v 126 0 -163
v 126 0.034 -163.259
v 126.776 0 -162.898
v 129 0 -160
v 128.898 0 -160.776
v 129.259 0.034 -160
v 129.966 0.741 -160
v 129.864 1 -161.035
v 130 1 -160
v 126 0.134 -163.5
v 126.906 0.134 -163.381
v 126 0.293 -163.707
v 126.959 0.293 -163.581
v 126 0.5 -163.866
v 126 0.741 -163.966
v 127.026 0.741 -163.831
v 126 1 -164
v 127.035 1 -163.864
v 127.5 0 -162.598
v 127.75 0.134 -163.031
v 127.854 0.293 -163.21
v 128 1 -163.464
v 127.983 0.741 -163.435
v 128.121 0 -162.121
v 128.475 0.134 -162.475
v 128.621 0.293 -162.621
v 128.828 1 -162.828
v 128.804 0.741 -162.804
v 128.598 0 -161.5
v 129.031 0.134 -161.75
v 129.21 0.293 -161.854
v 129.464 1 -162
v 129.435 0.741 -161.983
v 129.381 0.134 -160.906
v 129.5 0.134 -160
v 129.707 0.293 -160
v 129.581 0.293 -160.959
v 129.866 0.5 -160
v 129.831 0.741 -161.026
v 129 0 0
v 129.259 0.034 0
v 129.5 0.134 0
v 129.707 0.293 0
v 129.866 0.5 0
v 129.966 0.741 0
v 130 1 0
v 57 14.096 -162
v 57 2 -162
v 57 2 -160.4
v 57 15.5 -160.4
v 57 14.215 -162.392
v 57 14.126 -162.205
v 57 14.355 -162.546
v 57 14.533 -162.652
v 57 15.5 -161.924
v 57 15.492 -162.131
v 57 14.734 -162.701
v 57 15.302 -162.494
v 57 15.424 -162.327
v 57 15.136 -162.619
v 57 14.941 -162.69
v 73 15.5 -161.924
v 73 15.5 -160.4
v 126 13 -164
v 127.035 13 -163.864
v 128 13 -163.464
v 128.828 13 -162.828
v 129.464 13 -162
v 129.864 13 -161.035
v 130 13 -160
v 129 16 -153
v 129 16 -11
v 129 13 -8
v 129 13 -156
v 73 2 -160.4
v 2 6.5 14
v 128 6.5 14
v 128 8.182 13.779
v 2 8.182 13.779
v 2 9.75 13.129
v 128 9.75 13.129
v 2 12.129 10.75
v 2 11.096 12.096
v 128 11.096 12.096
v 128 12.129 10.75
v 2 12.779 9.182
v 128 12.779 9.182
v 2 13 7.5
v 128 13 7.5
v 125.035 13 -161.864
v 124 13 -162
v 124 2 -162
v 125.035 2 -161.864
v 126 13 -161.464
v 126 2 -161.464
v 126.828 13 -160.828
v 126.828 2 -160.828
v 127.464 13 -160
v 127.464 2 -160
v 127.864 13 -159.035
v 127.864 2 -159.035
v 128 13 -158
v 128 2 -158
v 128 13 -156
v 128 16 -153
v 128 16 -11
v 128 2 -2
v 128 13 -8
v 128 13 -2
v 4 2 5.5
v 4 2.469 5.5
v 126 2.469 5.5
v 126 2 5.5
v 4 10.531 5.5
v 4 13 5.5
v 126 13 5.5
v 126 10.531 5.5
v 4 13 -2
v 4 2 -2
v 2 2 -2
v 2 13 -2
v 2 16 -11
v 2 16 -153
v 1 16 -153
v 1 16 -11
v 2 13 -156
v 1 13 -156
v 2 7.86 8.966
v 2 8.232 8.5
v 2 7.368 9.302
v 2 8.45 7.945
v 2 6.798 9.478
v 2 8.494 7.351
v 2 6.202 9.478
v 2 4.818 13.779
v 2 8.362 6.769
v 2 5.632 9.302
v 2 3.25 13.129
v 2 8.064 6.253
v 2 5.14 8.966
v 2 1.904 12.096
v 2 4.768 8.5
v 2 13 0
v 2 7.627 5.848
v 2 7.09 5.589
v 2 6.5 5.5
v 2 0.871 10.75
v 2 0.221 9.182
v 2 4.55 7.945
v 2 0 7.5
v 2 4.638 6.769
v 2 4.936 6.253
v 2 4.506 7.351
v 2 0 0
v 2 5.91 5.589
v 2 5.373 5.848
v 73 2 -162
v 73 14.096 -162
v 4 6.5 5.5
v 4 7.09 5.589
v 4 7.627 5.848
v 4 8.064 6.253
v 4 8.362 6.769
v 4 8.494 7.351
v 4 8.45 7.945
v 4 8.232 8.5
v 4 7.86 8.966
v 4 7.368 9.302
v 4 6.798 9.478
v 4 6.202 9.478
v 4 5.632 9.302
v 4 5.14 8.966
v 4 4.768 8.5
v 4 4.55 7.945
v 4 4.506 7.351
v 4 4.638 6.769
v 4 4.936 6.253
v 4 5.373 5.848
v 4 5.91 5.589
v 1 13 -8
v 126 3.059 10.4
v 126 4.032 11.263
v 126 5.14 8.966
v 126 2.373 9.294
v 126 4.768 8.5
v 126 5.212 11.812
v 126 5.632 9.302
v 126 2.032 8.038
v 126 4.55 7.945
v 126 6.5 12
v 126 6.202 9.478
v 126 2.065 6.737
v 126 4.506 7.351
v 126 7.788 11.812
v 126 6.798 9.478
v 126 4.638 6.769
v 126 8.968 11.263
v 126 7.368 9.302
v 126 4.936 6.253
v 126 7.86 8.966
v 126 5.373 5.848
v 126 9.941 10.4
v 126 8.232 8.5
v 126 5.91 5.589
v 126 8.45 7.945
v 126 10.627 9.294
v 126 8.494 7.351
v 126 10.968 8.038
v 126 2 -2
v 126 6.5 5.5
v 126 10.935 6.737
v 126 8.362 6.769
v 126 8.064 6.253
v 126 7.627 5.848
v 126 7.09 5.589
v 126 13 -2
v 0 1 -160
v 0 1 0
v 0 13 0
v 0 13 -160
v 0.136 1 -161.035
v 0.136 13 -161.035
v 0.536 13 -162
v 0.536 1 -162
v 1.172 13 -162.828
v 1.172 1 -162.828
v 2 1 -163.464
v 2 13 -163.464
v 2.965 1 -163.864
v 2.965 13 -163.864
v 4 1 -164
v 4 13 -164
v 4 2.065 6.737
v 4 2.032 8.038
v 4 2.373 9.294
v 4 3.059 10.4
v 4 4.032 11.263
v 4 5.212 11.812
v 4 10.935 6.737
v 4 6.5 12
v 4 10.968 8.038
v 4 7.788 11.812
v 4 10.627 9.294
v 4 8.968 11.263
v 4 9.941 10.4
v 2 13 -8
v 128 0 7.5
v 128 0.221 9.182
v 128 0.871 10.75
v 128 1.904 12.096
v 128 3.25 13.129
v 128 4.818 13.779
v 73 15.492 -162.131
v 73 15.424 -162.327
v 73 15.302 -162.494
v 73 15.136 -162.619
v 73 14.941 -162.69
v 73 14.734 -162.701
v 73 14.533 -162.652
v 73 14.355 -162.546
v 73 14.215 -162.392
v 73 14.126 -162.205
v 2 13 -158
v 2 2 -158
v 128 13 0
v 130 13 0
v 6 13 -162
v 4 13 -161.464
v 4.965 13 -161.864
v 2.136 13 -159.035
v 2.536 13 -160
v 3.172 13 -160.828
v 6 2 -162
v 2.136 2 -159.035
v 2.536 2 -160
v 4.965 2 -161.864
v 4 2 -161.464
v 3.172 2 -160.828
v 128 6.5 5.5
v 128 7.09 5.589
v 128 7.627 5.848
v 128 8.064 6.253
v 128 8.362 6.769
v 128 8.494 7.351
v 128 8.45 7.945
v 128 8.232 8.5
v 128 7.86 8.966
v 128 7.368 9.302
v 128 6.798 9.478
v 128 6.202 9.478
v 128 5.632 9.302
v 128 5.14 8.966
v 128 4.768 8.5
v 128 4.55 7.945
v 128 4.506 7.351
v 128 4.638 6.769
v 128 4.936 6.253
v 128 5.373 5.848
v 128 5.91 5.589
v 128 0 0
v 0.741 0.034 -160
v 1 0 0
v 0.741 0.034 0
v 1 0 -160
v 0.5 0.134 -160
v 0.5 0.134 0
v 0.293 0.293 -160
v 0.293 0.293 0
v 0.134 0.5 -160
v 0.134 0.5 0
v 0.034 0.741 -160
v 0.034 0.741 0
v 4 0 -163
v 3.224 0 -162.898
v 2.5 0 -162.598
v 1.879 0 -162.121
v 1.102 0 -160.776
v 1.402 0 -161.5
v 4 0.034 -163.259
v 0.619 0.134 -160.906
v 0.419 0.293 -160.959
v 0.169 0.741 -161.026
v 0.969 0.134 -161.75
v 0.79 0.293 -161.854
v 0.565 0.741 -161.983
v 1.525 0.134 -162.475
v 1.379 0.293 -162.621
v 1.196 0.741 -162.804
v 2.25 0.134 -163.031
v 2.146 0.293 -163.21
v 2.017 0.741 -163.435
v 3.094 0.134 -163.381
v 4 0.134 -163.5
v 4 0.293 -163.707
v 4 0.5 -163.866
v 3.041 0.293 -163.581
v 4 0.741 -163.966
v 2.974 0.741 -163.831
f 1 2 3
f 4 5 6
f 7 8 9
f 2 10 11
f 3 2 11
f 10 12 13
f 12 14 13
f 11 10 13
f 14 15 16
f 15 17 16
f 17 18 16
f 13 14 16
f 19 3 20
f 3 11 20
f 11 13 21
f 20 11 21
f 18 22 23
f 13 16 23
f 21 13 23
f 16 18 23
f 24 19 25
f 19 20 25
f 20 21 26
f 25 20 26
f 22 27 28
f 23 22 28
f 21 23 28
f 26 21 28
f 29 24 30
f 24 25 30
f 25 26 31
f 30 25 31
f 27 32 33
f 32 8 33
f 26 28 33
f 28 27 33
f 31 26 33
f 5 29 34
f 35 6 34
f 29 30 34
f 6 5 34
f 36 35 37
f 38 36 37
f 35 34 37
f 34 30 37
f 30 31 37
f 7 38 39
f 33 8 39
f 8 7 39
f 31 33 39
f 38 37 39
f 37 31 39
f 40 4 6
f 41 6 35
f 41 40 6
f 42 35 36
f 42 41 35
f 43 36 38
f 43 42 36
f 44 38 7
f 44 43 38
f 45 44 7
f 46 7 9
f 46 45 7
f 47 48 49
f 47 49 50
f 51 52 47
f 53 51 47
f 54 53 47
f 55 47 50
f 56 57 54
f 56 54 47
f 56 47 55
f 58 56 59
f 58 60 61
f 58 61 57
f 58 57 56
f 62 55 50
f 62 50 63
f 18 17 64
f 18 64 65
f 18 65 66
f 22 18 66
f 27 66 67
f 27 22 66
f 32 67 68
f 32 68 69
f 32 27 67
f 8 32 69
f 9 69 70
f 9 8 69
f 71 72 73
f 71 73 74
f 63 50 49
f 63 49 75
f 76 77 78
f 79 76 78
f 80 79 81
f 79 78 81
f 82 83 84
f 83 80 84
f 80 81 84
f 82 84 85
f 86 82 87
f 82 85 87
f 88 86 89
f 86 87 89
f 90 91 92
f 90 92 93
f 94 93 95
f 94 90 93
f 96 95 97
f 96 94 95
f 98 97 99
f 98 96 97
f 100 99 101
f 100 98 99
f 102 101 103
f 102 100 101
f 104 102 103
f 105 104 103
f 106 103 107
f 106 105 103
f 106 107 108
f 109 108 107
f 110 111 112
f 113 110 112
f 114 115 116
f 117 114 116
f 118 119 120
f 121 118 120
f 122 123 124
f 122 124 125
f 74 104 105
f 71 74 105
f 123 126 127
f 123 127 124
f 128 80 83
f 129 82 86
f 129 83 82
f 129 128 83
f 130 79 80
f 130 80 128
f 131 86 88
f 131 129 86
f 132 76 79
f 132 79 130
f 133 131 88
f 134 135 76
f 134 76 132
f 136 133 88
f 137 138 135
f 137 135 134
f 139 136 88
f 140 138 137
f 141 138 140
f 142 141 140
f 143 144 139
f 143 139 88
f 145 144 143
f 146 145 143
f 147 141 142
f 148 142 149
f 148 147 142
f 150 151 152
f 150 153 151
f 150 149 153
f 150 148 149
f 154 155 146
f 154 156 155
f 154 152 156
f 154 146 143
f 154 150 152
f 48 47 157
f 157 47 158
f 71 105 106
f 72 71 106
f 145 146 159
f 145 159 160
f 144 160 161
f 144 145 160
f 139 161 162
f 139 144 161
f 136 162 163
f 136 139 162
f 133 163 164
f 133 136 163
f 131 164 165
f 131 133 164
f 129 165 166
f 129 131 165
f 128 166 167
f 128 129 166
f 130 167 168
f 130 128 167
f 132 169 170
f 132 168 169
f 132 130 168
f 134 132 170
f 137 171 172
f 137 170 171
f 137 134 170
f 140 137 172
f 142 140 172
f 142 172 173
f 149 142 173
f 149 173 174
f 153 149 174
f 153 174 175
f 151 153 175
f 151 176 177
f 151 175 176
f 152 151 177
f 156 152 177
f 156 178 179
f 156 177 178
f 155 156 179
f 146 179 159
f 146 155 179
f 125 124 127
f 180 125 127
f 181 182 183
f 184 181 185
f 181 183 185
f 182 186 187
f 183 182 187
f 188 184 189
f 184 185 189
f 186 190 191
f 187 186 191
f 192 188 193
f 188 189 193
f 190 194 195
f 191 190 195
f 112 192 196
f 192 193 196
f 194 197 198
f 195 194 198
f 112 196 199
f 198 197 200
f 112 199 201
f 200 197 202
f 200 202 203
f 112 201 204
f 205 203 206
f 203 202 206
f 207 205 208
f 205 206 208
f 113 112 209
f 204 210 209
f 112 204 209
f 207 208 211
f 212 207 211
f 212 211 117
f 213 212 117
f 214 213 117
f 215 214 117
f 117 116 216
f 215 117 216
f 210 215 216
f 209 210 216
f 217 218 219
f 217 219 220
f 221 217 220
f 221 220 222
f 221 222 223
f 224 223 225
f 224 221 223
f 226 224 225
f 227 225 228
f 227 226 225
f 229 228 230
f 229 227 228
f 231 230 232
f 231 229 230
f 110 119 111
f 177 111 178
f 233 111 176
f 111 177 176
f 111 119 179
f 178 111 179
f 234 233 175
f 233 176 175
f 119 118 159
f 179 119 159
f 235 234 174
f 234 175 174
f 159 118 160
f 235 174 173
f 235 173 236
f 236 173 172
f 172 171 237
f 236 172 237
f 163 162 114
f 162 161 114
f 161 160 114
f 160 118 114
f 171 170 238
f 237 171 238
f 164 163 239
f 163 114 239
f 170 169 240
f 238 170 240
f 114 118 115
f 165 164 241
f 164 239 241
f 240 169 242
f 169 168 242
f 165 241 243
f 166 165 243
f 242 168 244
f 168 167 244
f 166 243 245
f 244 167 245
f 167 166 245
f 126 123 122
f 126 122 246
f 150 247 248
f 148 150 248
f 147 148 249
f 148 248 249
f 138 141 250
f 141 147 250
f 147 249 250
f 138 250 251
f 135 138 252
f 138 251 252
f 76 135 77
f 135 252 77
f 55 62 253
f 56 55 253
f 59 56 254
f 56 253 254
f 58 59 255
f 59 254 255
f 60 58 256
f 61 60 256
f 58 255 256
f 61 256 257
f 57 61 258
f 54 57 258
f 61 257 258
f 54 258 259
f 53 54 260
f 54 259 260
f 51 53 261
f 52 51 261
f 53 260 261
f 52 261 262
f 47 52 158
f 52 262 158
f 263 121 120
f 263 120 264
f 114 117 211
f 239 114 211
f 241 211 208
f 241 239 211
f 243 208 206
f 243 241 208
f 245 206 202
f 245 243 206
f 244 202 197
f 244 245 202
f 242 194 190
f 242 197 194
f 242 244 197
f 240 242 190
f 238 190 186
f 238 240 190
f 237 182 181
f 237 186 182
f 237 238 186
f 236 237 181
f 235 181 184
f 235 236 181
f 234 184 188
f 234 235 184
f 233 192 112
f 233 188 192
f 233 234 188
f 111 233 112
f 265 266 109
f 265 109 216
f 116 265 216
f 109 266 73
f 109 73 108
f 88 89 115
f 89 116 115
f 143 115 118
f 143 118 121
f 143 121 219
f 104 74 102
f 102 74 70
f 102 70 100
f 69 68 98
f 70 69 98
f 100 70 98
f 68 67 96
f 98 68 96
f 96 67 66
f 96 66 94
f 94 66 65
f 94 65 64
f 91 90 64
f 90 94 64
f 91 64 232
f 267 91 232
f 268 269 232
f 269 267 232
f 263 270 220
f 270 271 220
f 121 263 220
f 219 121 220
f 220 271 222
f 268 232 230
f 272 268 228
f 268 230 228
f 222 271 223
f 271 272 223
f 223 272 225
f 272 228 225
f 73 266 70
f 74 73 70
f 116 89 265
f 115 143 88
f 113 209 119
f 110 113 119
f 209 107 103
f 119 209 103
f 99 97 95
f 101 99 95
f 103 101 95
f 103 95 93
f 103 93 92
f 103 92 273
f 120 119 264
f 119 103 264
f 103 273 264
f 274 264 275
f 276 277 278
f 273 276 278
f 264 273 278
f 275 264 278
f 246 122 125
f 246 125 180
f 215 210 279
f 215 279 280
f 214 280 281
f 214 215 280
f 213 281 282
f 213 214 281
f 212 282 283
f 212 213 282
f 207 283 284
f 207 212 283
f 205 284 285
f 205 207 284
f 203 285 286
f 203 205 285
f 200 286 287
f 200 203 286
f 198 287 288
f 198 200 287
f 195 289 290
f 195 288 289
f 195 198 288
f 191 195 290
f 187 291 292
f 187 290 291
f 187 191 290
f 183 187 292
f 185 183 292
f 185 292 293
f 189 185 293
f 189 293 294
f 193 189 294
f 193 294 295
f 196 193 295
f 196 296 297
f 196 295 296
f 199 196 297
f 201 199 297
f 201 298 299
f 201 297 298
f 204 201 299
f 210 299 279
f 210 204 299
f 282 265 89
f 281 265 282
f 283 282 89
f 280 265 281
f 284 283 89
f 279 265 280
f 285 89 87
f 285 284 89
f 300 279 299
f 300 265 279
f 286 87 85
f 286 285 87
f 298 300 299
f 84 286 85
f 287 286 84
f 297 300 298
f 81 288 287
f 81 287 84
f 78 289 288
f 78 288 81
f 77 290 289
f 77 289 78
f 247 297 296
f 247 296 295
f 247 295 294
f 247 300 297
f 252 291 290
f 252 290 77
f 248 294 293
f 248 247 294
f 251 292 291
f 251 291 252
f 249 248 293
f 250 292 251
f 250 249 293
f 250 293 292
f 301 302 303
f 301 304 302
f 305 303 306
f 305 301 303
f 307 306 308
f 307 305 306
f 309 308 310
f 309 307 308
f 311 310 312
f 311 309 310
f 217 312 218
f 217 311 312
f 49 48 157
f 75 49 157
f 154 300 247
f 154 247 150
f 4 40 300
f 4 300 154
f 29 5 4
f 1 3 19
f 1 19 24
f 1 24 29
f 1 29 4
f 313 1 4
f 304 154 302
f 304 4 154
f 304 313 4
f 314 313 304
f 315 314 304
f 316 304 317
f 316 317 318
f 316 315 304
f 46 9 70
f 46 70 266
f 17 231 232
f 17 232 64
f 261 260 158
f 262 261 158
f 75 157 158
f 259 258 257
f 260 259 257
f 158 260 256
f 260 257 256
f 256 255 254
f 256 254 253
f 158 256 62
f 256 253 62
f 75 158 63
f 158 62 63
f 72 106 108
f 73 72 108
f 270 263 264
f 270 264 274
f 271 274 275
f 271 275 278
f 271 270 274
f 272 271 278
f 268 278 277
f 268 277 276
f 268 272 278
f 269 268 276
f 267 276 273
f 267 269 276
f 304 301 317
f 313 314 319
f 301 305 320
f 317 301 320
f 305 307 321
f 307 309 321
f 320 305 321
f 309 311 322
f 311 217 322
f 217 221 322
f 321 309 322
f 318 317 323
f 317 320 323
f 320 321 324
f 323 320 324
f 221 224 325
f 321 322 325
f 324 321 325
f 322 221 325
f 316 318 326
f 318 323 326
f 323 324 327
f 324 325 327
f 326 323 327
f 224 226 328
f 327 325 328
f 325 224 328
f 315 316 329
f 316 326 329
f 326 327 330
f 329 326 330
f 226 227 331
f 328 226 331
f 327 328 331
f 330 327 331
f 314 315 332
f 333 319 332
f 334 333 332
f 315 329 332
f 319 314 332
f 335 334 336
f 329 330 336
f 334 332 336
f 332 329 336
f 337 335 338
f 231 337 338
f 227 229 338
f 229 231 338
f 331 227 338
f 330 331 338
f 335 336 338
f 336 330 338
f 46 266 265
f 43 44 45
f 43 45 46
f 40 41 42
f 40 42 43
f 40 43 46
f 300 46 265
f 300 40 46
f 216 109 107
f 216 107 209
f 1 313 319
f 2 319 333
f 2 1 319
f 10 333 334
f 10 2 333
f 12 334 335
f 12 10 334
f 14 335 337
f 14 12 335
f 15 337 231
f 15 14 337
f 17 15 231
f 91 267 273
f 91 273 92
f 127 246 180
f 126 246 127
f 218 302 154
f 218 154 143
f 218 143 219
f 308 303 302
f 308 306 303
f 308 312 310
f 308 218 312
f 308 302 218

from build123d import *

# Parameters (mm, degrees)
SALIENTE_EXTRUIR1_DEPTH     = 13
CORTAR_EXTRUIR7_DEPTH       = 11
CORTAR_EXTRUIR9_DEPTH       = 140
CROQUIS10_R                 = 4.5
CORTAR_EXTRUIR10_DEPTH      = 122
CROQUIS11_W                 = 122
CROQUIS11_H                 = 12.524990812
CORTAR_EXTRUIR12_DEPTH      = 11
CORTAR_EXTRUIR13_DEPTH      = 130
CORTAR_EXTRUIR13_DEPTH_BACK = 130
CROQUIS12_R                 = 2
CROQUIS13_W                 = 16
CROQUIS13_H                 = 13.5
SALIENTE_EXTRUIR3_DEPTH     = 1.6
SALIENTE_EXTRUIR4_DEPTH     = 16
REDONDEO1_R                 = 1
SALIENTE_EXTRUIR5_DEPTH     = 1
SALIENTE_EXTRUIR6_DEPTH     = 1


with BuildPart() as part:
    # Croquis1 → Saliente-Extruir1 (new body)
    with BuildSketch(Plane(origin=(0, 0, 0), x_dir=(1, 0, 0), z_dir=(0, 1, 0))):
        with BuildLine():
            Line((130, 0), (128, 0))
            Line((128, 0), (128, -14))
            Line((128, -14), (2, -14))
            Line((2, -14), (2, 0))
            Line((2, 0), (0, 0))
            Line((0, 0), (0, 160))
            ThreePointArc((0, 160), (1.171572875, 162.828427125), (4, 164))
            Line((4, 164), (126, 164))
            ThreePointArc((126, 164), (128.828427125, 162.828427125), (130, 160))
            Line((130, 160), (130, 0))
        make_face()
    extrude(amount=SALIENTE_EXTRUIR1_DEPTH)

    # Croquis7 → Cortar-Extruir7 (cut)
    with BuildSketch(Plane(origin=(0, 13, 0), x_dir=(1, 0, 0), z_dir=(0, 1, 0))):
        with BuildLine():
            ThreePointArc((124, 162), (126.828427125, 160.828427125), (128, 158))
            Line((128, 158), (128, 2))
            Line((128, 2), (2, 2))
            Line((2, 2), (2, 158))
            ThreePointArc((2, 158), (3.171572875, 160.828427125), (6, 162))
            Line((6, 162), (62.001239157, 162))
            Line((62.001239157, 162), (124, 162))
        make_face()
    extrude(amount=-CORTAR_EXTRUIR7_DEPTH, mode=Mode.SUBTRACT)

    # Croquis8 → Cortar-Extruir9 (cut)
    with BuildSketch(Plane(origin=(128, 0, 0), x_dir=(0, 0, -1), z_dir=(1, 0, 0))):
        with BuildLine():
            ThreePointArc((-14, 6.5), (-12.096194078, 11.096194078), (-7.5, 13))
            Line((-7.5, 13), (-14, 13))
            Line((-14, 13), (-14, 6.5))
        make_face()
        with BuildLine():
            Line((-14, 0), (-7.5, 0))
            ThreePointArc((-7.5, 0), (-12.096194078, 1.903805922), (-14, 6.5))
            Line((-14, 6.5), (-14, 0))
        make_face()
    extrude(amount=-CORTAR_EXTRUIR9_DEPTH, mode=Mode.SUBTRACT)

    # Croquis10 → Cortar-Extruir10 (cut)
    with BuildSketch(Plane(origin=(4, 0, 0), x_dir=(0, 0, -1), z_dir=(1, 0, 0))):
        with Locations(Location((-7.5, 6.5, 0), (0, 0, 180))):
            Circle(CROQUIS10_R)
    extrude(amount=CORTAR_EXTRUIR10_DEPTH, mode=Mode.SUBTRACT)

    # Croquis11 → Cortar-Extruir12 (cut)
    with BuildSketch(Plane(origin=(0, 13, 0), x_dir=(1, 0, 0), z_dir=(0, 1, 0))):
        Polygon((4, 2), (4, -5.5), (6, -5.5), (126, -5.5), (126, 2), align=None)
        with Locations((65, 8.262495406)):
            Rectangle(CROQUIS11_W, CROQUIS11_H)
    extrude(amount=-CORTAR_EXTRUIR12_DEPTH, mode=Mode.SUBTRACT)

    # Croquis12 → Cortar-Extruir13 (cut, two sides: drawn at the far end of the back side and taken through both)
    with BuildSketch(Plane(origin=(4, 0, 0), x_dir=(0, 0, -1), z_dir=(1, 0, 0)).offset(-CORTAR_EXTRUIR13_DEPTH_BACK)):
        with Locations((-7.5, 6.5)):
            Circle(CROQUIS12_R)
    extrude(amount=CORTAR_EXTRUIR13_DEPTH + CORTAR_EXTRUIR13_DEPTH_BACK, mode=Mode.SUBTRACT)

    # Redondeo1
    redondeo1_edges = [part.edges().sort_by_distance(p)[0] for p in [
        (128.828427125, 0, -162.828427125),
        (130, 0, -80),
        (0, 0, -80),
        (1.171572875, 0, -162.828427125),
        (65, 0, -164),
    ]]
    fillet(redondeo1_edges, radius=REDONDEO1_R)

    # Croquis16 → Saliente-Extruir6 (add)
    with BuildSketch(Plane(origin=(128, 0, 0), x_dir=(0, 0, -1), z_dir=(1, 0, 0))):
        Polygon((156, 13), (153, 16), (11, 16), (8, 13), align=None)
    extrude(amount=SALIENTE_EXTRUIR6_DEPTH)


with BuildPart() as body_2:
    # Croquis13 → Saliente-Extruir3 (new body)
    with BuildSketch(Plane.XY.offset(-162)):
        with Locations((65, 8.75)):
            Rectangle(CROQUIS13_W, CROQUIS13_H)
    extrude(amount=SALIENTE_EXTRUIR3_DEPTH)

    # Croquis14 → Saliente-Extruir4 (add)
    with BuildSketch(Plane(origin=(73, 0, 0), x_dir=(0, 0, -1), z_dir=(1, 0, 0))):
        with BuildLine():
            Line((162, 14.095856006), (161.923719179, 15.5))
            ThreePointArc((161.923719179, 15.5), (162.703107232, 14.83819665), (162, 14.095856006))
        make_face()
    extrude(amount=-SALIENTE_EXTRUIR4_DEPTH)


with BuildPart() as body_3:
    # Croquis15 → Saliente-Extruir5 (new body)
    with BuildSketch(Plane(origin=(2, 0, 0), x_dir=(0, 0, -1), z_dir=(1, 0, 0))):
        Polygon((153, 16), (11, 16), (8, 13), (156, 13), align=None)
    extrude(amount=-SALIENTE_EXTRUIR5_DEPTH)


solid = Compound([part.part, body_2.part, body_3.part])
